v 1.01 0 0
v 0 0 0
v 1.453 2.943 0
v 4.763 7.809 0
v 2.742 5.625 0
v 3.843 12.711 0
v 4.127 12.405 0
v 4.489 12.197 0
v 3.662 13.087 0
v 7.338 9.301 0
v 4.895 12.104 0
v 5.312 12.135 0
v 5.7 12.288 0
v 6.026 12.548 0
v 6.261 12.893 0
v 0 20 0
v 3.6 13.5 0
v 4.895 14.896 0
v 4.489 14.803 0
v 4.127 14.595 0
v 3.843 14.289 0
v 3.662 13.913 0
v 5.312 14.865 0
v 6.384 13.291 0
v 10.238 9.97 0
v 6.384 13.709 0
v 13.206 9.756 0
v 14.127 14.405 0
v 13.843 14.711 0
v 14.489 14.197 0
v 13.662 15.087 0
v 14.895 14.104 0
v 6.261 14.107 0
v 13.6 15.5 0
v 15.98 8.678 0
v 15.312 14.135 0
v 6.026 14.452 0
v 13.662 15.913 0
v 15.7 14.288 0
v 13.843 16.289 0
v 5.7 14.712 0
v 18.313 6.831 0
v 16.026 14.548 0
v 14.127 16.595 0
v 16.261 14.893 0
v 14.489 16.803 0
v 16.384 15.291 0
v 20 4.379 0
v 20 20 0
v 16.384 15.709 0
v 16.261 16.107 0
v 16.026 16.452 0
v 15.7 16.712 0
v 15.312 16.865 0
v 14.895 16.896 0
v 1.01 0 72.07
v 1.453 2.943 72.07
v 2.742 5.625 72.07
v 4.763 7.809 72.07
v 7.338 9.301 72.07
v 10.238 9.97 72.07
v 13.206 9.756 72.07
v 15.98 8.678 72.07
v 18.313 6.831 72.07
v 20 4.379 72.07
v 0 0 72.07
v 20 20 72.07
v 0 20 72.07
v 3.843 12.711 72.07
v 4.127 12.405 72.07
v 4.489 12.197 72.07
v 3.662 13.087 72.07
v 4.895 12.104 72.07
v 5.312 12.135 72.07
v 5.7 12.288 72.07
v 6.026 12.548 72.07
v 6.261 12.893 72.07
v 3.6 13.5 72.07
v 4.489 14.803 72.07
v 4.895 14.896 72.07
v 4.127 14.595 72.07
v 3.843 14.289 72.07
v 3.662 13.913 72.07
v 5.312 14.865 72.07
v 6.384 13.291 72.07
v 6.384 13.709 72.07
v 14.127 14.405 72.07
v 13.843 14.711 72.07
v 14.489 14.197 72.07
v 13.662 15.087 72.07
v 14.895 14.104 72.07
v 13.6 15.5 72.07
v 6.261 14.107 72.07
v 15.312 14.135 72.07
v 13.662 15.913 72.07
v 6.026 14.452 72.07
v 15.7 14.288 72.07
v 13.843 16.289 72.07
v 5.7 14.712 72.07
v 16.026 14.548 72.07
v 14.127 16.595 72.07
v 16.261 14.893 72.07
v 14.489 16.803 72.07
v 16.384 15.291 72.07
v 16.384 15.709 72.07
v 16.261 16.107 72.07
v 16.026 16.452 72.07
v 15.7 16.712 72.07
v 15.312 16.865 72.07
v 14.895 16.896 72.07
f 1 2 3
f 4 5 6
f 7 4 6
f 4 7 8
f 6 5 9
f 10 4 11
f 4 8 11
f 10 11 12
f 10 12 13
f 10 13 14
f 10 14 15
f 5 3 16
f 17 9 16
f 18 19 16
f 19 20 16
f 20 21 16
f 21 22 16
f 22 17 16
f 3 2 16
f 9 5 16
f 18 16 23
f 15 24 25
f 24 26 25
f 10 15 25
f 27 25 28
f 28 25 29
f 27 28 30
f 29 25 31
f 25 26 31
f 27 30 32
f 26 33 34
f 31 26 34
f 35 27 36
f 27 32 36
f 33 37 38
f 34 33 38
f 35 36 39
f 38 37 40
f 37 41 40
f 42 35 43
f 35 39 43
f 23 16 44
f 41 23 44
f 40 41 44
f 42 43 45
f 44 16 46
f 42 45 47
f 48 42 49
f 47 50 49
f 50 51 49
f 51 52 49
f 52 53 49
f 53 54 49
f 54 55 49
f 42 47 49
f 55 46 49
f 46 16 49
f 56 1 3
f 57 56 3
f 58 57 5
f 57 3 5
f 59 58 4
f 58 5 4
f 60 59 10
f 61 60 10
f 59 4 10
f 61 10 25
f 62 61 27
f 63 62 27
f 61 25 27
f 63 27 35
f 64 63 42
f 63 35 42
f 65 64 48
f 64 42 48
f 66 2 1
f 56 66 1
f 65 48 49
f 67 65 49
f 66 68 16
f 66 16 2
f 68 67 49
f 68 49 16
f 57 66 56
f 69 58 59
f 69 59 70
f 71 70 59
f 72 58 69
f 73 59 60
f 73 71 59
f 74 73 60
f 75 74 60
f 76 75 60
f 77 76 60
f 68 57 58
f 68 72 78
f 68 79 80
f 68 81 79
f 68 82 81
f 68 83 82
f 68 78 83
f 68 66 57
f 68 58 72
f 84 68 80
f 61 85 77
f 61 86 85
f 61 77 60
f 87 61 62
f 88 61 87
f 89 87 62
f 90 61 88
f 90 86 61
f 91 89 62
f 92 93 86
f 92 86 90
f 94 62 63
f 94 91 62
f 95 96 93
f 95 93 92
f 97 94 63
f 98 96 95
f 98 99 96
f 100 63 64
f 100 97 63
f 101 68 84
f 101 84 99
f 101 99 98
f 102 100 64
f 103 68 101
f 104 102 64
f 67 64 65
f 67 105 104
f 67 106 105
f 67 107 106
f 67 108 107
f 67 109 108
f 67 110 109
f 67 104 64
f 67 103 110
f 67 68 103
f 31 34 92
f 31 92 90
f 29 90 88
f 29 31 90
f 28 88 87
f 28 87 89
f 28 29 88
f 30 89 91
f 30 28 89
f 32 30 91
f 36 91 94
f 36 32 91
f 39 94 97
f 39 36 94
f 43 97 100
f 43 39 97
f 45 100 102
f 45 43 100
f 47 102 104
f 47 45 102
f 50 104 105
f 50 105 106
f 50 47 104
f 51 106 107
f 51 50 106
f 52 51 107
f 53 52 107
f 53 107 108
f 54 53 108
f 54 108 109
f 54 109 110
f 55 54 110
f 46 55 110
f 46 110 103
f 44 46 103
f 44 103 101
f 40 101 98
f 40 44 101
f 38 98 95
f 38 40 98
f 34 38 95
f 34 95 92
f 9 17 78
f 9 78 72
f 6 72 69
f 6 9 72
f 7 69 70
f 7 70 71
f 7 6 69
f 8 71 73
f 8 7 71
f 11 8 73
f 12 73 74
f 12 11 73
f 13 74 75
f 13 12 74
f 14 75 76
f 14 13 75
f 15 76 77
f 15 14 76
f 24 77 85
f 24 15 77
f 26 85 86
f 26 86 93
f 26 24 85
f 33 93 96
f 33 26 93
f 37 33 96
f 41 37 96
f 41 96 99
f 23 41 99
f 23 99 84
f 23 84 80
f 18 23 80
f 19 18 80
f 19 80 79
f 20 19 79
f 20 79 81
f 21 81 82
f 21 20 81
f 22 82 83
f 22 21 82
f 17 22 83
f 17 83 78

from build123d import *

# Parameters (mm, degrees)
SKETCH1_R           = 1.4
BOSS_EXTRUDE1_DEPTH = 72.07


with BuildPart() as part:
    # Sketch1 → Boss-Extrude1 (new body)
    with BuildSketch(Plane.XY):
        with BuildLine():
            Line((0, 0), (1.01, 0))
            ThreePointArc((1.01, 0), (8.762779495, 9.744229061), (20, 4.379486271))
            Line((20, 4.379486271), (20, 20))
            Line((20, 20), (0, 20))
            Line((0, 20), (0, 0))
        make_face()
        with Locations(Location((5, 13.5, 0), (0, 0, 180))):
            Circle(SKETCH1_R, mode=Mode.SUBTRACT)
        with Locations(Location((15, 15.5, 0), (0, 0, 180))):
            Circle(SKETCH1_R, mode=Mode.SUBTRACT)
    extrude(amount=BOSS_EXTRUDE1_DEPTH)


solid = part.part
